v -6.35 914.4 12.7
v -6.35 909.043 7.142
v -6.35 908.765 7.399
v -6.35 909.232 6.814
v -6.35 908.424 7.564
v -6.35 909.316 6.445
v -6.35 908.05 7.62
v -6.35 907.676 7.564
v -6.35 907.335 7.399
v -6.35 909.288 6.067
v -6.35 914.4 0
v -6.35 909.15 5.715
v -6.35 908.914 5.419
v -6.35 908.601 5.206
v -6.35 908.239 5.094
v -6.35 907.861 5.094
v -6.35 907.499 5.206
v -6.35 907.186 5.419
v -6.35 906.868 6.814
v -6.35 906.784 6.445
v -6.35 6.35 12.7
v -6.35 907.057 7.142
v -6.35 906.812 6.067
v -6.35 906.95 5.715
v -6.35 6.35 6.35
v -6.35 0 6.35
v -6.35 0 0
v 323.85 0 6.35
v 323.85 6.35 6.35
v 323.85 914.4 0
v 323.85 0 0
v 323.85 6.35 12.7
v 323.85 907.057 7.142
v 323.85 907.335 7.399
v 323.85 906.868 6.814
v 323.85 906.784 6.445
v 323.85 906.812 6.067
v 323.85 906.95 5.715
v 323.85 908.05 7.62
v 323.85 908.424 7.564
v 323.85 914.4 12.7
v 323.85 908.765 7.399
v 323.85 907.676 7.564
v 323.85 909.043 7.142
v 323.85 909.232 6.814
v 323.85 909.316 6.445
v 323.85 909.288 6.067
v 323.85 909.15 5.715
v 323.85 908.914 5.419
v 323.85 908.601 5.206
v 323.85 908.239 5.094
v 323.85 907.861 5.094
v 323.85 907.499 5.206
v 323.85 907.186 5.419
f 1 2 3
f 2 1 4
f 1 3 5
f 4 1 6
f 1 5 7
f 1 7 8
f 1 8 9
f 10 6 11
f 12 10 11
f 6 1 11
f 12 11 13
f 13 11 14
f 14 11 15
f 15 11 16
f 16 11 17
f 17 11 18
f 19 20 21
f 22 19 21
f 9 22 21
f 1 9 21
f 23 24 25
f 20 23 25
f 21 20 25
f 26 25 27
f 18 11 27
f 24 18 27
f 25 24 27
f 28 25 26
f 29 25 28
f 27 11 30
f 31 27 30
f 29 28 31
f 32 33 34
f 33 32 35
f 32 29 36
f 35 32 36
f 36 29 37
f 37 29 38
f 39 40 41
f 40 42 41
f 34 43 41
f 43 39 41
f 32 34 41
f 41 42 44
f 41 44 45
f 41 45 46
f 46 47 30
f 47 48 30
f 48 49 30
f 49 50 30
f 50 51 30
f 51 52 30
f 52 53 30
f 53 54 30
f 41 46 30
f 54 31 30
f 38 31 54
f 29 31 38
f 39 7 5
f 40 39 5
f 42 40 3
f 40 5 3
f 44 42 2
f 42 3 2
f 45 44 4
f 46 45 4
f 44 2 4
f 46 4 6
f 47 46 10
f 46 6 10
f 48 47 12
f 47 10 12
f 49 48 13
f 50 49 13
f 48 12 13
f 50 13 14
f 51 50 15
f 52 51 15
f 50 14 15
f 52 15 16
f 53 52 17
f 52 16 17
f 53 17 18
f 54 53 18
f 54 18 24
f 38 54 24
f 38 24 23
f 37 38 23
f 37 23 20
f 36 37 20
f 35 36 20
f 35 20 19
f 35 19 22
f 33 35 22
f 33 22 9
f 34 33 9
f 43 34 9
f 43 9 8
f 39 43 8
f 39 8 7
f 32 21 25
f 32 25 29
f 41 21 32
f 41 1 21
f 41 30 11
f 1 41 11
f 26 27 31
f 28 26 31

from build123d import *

# Parameters (mm, degrees)
BOSS_EXTRUDE1_DEPTH = 12.7
SKETCH2_W           = 330.2
SKETCH2_H           = 6.35
CUT_EXTRUDE1_DEPTH  = 6.35
SKETCH3_R           = 1.27
CUT_EXTRUDE2_DEPTH  = 331.2


with BuildPart() as part:
    # Sketch1 → Boss-Extrude1 (new body)
    with BuildSketch(Plane.XY):
        Polygon((0, 0), (317.5, 0), (323.85, 0), (323.85, 419.1), (323.85, 914.4), (-6.35, 914.4), (-6.35, 419.1), (-6.35, 0), align=None)
    extrude(amount=BOSS_EXTRUDE1_DEPTH)

    # Sketch2 → Cut-Extrude1 (cut)
    with BuildSketch(Plane.XY.offset(12.7)):
        with Locations((158.75, 3.175)):
            Rectangle(SKETCH2_W, SKETCH2_H)
    extrude(amount=-CUT_EXTRUDE1_DEPTH, mode=Mode.SUBTRACT)

    # Sketch3 → Cut-Extrude2 (cut, through all)
    with BuildSketch(Plane.ZY.offset(6.35)):
        with Locations((6.35, 908.05)):
            Circle(SKETCH3_R)
    extrude(amount=-CUT_EXTRUDE2_DEPTH, mode=Mode.SUBTRACT)


solid = part.part
